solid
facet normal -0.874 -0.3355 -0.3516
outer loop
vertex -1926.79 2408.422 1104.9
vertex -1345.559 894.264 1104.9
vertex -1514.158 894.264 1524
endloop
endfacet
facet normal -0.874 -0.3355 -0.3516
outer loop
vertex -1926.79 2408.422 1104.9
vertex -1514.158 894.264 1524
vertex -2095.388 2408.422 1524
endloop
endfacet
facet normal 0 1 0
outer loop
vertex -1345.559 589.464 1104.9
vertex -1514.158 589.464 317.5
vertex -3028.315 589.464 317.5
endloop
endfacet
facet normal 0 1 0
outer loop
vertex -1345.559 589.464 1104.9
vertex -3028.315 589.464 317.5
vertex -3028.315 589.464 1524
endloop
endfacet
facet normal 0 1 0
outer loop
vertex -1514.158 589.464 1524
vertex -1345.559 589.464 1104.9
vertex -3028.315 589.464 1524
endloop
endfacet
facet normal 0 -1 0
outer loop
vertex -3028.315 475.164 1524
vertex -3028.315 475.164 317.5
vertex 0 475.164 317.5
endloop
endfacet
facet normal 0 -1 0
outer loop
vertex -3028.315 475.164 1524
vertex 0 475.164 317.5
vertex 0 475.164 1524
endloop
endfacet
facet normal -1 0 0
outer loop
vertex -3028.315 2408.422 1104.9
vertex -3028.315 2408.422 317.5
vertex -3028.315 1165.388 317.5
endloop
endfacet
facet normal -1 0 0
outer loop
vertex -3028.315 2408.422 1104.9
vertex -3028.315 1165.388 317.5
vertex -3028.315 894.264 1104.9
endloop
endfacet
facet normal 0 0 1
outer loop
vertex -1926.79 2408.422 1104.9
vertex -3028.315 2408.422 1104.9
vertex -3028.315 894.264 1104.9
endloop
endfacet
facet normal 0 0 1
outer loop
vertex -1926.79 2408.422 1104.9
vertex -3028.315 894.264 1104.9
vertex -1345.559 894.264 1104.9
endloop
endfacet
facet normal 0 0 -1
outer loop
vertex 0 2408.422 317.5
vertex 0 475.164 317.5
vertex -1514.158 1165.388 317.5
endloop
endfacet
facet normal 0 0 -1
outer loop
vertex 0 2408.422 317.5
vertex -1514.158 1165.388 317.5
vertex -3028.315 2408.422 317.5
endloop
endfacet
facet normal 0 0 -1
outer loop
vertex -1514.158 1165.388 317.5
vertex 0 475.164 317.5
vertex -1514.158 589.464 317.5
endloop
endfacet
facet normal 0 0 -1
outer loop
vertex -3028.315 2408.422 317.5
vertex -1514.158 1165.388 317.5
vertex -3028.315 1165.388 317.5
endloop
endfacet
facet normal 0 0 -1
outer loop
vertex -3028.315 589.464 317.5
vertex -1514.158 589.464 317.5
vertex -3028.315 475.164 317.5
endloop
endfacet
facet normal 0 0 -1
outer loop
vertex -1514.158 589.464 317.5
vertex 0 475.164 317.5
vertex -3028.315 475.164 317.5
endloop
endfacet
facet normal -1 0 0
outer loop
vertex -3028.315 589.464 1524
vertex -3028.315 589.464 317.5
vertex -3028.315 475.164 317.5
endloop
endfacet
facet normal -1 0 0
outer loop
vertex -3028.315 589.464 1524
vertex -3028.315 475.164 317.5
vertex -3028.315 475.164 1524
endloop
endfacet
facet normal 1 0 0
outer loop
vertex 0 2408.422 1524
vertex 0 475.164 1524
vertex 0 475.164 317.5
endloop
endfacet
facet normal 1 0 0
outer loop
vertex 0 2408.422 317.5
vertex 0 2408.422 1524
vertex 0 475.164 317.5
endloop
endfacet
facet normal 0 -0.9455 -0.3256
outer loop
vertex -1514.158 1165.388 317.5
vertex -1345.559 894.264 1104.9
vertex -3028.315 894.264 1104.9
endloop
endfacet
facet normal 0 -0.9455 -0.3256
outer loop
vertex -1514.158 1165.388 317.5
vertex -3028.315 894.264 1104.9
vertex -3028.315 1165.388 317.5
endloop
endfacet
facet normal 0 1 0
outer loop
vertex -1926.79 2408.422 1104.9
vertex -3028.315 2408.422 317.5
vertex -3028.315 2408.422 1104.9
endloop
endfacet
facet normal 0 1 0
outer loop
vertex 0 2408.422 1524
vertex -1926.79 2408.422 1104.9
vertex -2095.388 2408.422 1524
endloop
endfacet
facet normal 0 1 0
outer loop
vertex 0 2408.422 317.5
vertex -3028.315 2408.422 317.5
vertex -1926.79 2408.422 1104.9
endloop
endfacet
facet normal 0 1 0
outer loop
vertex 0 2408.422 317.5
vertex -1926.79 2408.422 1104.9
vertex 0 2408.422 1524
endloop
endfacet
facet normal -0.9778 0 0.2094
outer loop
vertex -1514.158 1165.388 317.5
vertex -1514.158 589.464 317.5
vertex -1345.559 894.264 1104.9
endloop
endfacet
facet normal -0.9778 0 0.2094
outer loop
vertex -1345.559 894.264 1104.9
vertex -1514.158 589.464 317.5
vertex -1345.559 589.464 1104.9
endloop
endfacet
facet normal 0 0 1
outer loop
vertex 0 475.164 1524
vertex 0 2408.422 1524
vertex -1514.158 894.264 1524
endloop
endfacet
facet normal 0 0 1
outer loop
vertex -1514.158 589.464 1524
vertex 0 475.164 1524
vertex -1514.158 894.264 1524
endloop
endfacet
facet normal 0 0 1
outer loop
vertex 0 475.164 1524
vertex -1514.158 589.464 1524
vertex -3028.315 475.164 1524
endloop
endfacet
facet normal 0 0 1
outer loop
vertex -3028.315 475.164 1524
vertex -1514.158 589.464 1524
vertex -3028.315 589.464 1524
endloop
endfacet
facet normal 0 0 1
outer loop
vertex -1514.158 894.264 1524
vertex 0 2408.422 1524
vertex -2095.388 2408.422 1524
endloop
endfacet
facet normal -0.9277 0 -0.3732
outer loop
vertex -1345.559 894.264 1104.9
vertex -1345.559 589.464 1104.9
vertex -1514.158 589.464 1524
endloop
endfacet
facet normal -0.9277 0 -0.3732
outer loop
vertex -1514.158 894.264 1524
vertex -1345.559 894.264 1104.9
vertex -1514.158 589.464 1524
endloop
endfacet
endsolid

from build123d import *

# Parameters (mm, degrees)
SKETCH1_W               = 1206.5
SKETCH1_H               = 419.1
BOSS_EXTRUDE4_DEPTH     = 1514.1575
SKETCH8_W               = 1206.5
SKETCH8_H               = 114.3
BOSS_EXTRUDE5_DEPTH     = 1514.1575
CUT_EXTRUDE3_DEPTH      = 3416.979003042
CUT_EXTRUDE3_DEPTH_BACK = 304.8
BOSS_EXTRUDE6_DEPTH     = 1514.1575
CUT_EXTRUDE4_REACH      = 4160.577
BOSS_EXTRUDE11_DEPTH    = 451.741385412
BOSS_EXTRUDE12_DEPTH    = 1514.1575


with BuildPart() as part:
    # Sketch1 → Boss-Extrude4 (new body)
    with BuildSketch(Plane(origin=(0, 0, 0), x_dir=(0, 0, -1), z_dir=(1, 0, 0))):
        with Locations((-920.75, 684.714248705)):
            Rectangle(SKETCH1_W, SKETCH1_H)
    extrude(amount=-BOSS_EXTRUDE4_DEPTH)

    # Sketch8 → Boss-Extrude5 (add)
    with BuildSketch(Plane.ZY.offset(1514.1575)):
        with Locations((920.75, 532.314248705)):
            Rectangle(SKETCH8_W, SKETCH8_H)
    extrude(amount=BOSS_EXTRUDE5_DEPTH)

    # Sketch9 → Cut-Extrude3 (cut, two sides: drawn at the far end of the back side and taken through both)
    with BuildSketch(Plane(origin=(0, 894.264248705, 0), x_dir=(1, 0, 0), z_dir=(0, 1, 0)).offset(-CUT_EXTRUDE3_DEPTH_BACK)):
        Polygon((-1514.1575, -317.5), (-1345.558955244, -1104.9), (-1514.1575, -1524), align=None)
    extrude(amount=CUT_EXTRUDE3_DEPTH + CUT_EXTRUDE3_DEPTH_BACK, mode=Mode.SUBTRACT)

    # Sketch10 → Boss-Extrude6 (add)
    with BuildSketch(Plane(origin=(0, 894.264248705, 0), x_dir=(1, 0, 0), z_dir=(0, 1, 0))):
        Polygon((-1345.558955244, -1104.9), (0, -1104.9), (0, -317.5), (-3028.315, -317.5), (-3028.315, -1104.9), align=None)
    extrude(amount=BOSS_EXTRUDE6_DEPTH)

    # Cut-Extrude4: up to this plane
    cut_extrude4_end = Plane(origin=(-1514.1575, -628.758932529, 317.5), z_dir=(0.9778354843848671, 0, -0.20937470114083095))
    # Maybe Delete This Sketch → Cut-Extrude4 (cut, up to the surface)
    with BuildSketch(Plane.ZY.offset(3028.315), mode=Mode.PRIVATE) as cut_extrude4_sk1:
        Polygon((1104.9, 894.264248705), (317.5, 1165.387811409), (317.5, 894.264248705), align=None)
    cut_extrude4_tool1 = split(extrude(cut_extrude4_sk1.sketch, amount=-CUT_EXTRUDE4_REACH, mode=Mode.PRIVATE), bisect_by=cut_extrude4_end, keep=Keep.BOTH, mode=Mode.PRIVATE)
    add(cut_extrude4_tool1.solids().sort_by_distance((-3028.315, 984.63877, 579.966667))[0], mode=Mode.SUBTRACT)

    # Sketch24 → Boss-Extrude11 (add, along a direction that is not the sketch's normal)
    with BuildSketch(Plane.XY.offset(1104.9)):
        Polygon((-1345.558955244, 894.264248705), (-1926.789562873, 2408.421748705), (0, 2408.421748705), (0, 894.264248705), align=None)
    extrude(amount=BOSS_EXTRUDE11_DEPTH, dir=(-0.37321916964166585, 0, 0.9277432033768749))

    # Sketch23 → Boss-Extrude12 (add)
    with BuildSketch(Plane(origin=(0, 894.264248705, 0), x_dir=(1, 0, 0), z_dir=(0, 1, 0))):
        Polygon((-1345.558955244, -1104.9), (-1514.1575, -1524), (0, -1524), (0, -1104.9), align=None)
    extrude(amount=BOSS_EXTRUDE12_DEPTH)


solid = part.part
